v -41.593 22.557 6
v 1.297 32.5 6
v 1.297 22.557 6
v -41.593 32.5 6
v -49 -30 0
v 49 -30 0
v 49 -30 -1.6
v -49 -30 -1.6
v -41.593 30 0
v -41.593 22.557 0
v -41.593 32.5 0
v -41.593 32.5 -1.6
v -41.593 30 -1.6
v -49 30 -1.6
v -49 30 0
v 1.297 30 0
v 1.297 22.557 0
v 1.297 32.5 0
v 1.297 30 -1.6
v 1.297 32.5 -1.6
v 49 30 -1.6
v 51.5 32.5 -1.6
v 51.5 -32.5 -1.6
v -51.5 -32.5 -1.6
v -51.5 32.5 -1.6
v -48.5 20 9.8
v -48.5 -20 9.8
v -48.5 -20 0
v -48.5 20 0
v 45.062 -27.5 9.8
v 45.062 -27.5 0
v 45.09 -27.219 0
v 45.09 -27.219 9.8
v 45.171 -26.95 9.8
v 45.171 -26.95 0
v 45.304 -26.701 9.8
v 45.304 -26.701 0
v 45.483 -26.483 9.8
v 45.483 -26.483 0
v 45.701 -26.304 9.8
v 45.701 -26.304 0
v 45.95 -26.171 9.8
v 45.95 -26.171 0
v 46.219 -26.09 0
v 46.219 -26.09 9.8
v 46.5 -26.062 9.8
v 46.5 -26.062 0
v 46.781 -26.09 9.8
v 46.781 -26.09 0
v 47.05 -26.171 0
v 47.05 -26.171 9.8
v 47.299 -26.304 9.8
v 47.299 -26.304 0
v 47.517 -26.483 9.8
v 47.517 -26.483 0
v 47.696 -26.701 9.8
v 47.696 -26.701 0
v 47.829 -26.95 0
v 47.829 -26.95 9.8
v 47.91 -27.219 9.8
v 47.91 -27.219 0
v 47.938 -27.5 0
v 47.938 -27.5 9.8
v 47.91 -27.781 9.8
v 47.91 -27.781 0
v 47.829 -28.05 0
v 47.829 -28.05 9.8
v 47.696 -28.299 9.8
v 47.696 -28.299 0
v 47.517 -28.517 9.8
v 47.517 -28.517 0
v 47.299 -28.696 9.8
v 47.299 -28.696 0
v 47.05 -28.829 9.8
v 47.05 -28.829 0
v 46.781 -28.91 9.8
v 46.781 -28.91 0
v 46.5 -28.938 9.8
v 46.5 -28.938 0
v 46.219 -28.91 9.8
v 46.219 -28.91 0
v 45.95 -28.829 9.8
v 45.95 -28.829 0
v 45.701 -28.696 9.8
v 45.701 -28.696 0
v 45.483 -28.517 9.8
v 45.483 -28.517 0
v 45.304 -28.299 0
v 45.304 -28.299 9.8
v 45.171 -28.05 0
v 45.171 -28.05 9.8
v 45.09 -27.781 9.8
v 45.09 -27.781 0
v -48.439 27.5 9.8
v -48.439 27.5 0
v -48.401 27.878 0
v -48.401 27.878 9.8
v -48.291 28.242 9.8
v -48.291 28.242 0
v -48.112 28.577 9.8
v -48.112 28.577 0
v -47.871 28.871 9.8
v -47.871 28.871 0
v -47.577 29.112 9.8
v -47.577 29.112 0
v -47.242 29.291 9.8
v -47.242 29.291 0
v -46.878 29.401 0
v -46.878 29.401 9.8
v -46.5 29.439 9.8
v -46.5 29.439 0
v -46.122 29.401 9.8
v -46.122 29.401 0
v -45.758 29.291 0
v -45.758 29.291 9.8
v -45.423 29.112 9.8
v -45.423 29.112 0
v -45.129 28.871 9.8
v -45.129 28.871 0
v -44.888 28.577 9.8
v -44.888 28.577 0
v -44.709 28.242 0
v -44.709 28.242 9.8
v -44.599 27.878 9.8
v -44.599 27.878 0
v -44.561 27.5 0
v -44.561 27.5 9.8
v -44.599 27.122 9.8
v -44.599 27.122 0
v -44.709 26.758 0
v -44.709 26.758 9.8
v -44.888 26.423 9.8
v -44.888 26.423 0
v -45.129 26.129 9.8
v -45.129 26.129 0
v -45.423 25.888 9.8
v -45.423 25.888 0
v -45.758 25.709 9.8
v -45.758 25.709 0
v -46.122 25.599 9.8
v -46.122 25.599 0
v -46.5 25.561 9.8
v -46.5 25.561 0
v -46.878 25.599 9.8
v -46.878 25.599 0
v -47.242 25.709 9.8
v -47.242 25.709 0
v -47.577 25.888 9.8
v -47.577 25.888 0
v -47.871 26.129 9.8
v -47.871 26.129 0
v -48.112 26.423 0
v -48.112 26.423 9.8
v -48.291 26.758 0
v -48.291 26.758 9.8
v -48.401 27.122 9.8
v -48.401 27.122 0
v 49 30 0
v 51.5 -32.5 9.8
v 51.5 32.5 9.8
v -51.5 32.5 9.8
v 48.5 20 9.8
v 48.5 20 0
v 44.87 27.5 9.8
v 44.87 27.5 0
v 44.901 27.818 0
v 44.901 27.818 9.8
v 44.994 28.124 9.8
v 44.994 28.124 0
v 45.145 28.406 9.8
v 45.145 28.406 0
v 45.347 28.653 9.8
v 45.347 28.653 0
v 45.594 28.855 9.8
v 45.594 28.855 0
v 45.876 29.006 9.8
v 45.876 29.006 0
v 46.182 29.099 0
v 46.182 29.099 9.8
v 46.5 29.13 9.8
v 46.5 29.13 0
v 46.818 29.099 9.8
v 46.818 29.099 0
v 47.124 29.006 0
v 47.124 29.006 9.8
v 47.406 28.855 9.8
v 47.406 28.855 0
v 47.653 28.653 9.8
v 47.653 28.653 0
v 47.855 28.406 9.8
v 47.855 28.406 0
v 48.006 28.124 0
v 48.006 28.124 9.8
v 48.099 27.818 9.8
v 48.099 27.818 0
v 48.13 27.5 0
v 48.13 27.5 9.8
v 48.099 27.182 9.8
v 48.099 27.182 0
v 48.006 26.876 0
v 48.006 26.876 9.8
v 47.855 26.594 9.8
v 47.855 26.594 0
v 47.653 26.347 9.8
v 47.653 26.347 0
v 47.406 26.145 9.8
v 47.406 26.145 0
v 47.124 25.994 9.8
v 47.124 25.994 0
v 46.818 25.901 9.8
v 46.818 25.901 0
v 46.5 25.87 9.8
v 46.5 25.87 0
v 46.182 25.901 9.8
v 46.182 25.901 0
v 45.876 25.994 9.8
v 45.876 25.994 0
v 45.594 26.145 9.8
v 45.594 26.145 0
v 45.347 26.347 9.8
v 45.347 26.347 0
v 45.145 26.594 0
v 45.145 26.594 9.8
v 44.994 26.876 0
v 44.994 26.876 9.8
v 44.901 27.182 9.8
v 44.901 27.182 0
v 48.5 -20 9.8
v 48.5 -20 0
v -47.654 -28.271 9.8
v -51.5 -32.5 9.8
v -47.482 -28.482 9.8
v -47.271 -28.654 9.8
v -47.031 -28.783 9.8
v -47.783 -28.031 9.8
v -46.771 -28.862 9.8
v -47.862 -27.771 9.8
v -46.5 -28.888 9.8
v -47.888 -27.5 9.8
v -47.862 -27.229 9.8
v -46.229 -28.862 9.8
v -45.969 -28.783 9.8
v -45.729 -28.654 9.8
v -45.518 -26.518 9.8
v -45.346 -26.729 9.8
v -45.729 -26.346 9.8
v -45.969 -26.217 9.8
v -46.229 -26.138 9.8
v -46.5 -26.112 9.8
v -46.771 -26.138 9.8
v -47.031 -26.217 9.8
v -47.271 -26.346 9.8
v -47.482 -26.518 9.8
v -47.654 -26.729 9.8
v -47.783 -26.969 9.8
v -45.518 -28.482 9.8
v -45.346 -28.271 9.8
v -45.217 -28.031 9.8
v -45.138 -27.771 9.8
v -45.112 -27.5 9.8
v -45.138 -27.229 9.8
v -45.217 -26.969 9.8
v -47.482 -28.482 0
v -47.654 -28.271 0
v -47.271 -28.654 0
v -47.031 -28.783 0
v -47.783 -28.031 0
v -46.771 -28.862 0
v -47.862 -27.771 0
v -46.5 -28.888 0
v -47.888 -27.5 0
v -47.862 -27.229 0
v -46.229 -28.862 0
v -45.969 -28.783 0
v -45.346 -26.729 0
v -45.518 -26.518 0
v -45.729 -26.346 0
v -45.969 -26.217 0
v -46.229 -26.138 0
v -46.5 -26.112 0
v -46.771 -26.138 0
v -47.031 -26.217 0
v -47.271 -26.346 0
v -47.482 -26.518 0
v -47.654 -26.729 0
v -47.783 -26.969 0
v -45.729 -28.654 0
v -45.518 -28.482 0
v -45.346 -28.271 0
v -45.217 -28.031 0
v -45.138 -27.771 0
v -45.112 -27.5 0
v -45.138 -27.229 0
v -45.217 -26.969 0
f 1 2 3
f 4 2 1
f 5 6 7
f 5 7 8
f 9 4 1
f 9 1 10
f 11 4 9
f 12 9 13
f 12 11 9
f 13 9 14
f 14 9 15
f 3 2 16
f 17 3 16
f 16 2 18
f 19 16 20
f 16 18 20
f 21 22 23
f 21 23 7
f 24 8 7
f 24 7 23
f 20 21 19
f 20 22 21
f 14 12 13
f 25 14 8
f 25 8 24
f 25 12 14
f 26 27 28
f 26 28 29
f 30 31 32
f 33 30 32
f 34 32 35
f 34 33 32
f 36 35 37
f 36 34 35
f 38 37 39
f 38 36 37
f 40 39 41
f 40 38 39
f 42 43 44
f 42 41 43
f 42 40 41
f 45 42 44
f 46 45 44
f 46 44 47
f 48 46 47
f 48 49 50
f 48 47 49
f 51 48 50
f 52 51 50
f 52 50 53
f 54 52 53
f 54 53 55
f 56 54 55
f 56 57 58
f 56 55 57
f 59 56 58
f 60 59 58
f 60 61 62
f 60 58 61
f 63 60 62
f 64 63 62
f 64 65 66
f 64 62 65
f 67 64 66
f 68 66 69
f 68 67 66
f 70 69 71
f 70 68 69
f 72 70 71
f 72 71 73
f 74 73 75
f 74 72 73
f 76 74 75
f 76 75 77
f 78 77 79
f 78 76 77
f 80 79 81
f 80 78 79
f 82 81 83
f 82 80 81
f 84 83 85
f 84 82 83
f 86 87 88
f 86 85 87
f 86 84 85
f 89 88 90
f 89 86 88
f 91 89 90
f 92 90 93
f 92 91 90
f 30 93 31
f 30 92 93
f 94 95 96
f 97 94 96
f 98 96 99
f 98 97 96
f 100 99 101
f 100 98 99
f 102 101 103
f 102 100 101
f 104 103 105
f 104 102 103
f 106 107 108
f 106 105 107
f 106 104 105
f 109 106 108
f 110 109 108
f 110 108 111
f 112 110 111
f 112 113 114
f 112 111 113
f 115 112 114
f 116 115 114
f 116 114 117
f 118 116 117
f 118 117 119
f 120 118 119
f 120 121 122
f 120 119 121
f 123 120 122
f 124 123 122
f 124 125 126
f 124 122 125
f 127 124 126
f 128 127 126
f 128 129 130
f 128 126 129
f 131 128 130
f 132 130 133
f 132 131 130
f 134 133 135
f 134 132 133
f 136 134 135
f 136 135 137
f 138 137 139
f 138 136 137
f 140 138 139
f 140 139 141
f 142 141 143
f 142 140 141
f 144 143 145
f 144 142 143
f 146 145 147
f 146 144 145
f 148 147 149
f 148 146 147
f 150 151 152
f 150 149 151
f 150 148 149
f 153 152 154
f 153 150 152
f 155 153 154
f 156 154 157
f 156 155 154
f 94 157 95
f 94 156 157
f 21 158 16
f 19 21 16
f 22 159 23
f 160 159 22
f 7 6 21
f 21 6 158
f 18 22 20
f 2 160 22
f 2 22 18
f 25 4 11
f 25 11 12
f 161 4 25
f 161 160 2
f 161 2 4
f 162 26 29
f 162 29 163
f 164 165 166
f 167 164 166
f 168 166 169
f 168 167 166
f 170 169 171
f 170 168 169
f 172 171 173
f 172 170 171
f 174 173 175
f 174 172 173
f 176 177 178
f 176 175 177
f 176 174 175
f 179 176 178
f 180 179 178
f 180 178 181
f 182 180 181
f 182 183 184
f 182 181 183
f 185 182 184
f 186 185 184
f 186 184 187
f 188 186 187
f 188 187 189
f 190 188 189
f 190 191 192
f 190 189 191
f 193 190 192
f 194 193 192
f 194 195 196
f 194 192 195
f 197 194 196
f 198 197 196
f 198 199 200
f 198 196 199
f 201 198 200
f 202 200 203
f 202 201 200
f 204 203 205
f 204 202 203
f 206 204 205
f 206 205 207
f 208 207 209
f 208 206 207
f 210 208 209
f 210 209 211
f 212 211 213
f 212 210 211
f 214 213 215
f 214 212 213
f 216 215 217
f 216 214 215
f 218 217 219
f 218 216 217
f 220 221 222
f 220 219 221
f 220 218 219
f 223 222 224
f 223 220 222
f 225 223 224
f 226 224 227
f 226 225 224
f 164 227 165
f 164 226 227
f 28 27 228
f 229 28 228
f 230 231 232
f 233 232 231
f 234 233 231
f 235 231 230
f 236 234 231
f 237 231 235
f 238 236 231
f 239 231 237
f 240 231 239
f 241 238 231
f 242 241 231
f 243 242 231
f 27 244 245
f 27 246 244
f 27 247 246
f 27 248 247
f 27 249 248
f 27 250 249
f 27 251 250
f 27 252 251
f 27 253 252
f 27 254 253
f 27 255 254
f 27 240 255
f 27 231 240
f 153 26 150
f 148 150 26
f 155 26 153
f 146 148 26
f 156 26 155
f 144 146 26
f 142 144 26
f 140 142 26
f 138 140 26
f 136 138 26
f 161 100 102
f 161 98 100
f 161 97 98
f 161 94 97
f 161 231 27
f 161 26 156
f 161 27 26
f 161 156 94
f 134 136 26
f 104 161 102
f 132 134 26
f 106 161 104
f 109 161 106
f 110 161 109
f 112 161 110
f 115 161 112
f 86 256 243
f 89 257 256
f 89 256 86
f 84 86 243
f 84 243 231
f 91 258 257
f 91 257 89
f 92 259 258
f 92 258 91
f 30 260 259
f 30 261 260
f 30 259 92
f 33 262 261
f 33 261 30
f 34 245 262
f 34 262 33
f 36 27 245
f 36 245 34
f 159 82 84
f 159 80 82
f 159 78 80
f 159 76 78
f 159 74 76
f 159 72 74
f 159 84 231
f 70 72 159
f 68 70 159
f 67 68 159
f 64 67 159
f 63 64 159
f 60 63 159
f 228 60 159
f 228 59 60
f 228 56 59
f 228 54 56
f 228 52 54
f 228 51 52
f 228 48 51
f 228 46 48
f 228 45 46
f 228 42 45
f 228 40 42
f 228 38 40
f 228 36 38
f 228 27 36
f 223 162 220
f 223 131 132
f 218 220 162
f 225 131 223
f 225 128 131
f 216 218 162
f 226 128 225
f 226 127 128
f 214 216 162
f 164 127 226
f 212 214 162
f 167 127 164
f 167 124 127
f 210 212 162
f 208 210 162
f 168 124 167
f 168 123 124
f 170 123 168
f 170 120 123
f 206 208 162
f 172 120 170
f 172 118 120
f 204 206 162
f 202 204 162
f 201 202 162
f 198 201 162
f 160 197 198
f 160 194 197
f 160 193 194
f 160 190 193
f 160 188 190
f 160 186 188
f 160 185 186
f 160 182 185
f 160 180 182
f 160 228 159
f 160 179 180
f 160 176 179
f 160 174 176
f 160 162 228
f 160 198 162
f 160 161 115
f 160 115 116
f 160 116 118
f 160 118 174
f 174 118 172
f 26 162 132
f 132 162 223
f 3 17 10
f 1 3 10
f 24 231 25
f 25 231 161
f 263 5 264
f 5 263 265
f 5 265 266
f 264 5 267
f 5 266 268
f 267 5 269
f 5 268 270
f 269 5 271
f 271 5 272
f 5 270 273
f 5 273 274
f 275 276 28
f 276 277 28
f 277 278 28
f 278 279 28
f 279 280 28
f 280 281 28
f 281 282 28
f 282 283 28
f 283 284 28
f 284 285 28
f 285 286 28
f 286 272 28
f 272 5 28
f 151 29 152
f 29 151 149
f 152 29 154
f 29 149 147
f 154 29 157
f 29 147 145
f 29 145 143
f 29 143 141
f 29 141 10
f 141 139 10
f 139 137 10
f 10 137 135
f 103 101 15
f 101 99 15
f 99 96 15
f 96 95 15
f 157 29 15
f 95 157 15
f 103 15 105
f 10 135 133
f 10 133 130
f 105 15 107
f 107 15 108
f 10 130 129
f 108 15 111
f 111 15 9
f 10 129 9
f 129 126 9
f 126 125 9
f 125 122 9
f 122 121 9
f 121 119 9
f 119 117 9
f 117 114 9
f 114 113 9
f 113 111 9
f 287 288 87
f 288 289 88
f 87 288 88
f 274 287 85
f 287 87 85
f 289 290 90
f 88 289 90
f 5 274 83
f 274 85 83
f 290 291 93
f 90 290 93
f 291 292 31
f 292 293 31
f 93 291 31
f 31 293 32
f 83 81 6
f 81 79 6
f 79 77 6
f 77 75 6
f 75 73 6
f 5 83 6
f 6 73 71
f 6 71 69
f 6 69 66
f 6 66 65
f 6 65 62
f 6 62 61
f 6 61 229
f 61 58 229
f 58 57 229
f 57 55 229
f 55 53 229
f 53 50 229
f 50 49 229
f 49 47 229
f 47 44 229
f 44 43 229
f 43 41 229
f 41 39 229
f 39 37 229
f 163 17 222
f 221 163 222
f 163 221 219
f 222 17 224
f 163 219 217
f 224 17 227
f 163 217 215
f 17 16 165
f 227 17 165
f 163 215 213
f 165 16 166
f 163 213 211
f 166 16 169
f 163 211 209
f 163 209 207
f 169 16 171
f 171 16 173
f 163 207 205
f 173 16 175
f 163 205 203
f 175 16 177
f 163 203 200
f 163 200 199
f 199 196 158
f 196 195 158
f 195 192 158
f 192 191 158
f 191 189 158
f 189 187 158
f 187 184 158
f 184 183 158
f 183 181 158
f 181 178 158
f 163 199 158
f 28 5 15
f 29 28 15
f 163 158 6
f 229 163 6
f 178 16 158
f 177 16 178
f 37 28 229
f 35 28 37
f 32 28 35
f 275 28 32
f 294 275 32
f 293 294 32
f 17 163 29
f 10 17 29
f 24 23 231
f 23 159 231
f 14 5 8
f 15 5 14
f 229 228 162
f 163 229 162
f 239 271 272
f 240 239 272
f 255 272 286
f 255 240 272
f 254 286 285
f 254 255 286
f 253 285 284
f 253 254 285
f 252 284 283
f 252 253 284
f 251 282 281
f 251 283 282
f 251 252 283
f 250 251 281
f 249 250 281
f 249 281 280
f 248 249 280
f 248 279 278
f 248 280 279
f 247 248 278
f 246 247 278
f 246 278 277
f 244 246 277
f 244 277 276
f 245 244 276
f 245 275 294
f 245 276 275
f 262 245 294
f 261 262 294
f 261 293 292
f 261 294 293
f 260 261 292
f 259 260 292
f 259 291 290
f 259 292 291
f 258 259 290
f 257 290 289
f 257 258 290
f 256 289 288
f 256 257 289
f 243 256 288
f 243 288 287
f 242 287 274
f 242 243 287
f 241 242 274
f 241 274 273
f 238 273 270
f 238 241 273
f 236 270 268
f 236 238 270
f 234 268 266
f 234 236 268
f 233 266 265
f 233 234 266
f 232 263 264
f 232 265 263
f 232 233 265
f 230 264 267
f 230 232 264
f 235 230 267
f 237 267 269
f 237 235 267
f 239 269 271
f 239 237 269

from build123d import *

# Parameters (mm, degrees)
SKETCH2_W               = 103
SKETCH2_H               = 65
BOSS_EXTRUDE1_DEPTH     = 9.8
SKETCH4_W               = 97
SKETCH4_H               = 40
CUT_EXTRUDE1_DEPTH      = 35
SKETCH6_W               = 42.890315644
SKETCH6_H               = 9.943201627
CUT_EXTRUDE3_DEPTH      = 6
SKETCH9_W               = 103
SKETCH9_H               = 65
SKETCH9_W_2             = 98
SKETCH9_H_2             = 60
BOSS_EXTRUDE2_DEPTH     = 1.6
SKETCH10_W              = 42.890315644
SKETCH10_H              = 16.344193147
CUT_EXTRUDE4_DEPTH      = 9.943201627
CUT_EXTRUDE7_DEPTH      = 28
CUT_EXTRUDE7_DEPTH_BACK = 33
SKETCH14_R              = 1.629970135
SKETCH14_R_2            = 1.938580121
SKETCH14_R_3            = 1.388390768
SKETCH14_R_4            = 1.438089521


with BuildPart() as part:
    # Sketch2 → Boss-Extrude1 (new body)
    with BuildSketch(Plane.XY):
        Rectangle(SKETCH2_W, SKETCH2_H)
    extrude(amount=BOSS_EXTRUDE1_DEPTH)

    # Sketch4 → Cut-Extrude1 (cut)
    with BuildSketch(Plane.XY.offset(9.8)):
        Rectangle(SKETCH4_W, SKETCH4_H)
    extrude(amount=-CUT_EXTRUDE1_DEPTH, mode=Mode.SUBTRACT)

    # Sketch6 → Cut-Extrude3 (cut)
    with BuildSketch(Plane(origin=(0, 0, 0), x_dir=(-1, 0, 0), z_dir=(0, 0, -1))):
        with Locations((20.148258429, 27.528399187)):
            Rectangle(SKETCH6_W, SKETCH6_H)
    extrude(amount=-CUT_EXTRUDE3_DEPTH, mode=Mode.SUBTRACT)

    # Sketch9 → Boss-Extrude2 (add)
    with BuildSketch(Plane(origin=(0, 0, 0), x_dir=(-1, 0, 0), z_dir=(0, 0, -1))):
        Rectangle(SKETCH9_W, SKETCH9_H)
        Rectangle(SKETCH9_W_2, SKETCH9_H_2, mode=Mode.SUBTRACT)
    extrude(amount=BOSS_EXTRUDE2_DEPTH)

    # Sketch10 → Cut-Extrude4 (cut)
    with BuildSketch(Plane(origin=(0, 32.5, 0), x_dir=(1, 0, 0), z_dir=(0, 1, 0))):
        with Locations((-20.148258429, 8.172096574)):
            Rectangle(SKETCH10_W, SKETCH10_H)
    extrude(amount=-CUT_EXTRUDE4_DEPTH, mode=Mode.SUBTRACT)

    # Sketch14 → Cut-Extrude7 (cut, two sides: drawn at the far end of the back side and taken through both)
    with BuildSketch(Plane(origin=(0, 0, -1.6), x_dir=(-1, 0, 0), z_dir=(0, 0, -1)).offset(-CUT_EXTRUDE7_DEPTH_BACK)):
        with Locations((-46.5, 27.5)):
            Circle(SKETCH14_R)
        with Locations((46.5, 27.5)):
            Circle(SKETCH14_R_2)
        with Locations((46.5, -27.5)):
            Circle(SKETCH14_R_3)
        with Locations((-46.5, -27.5)):
            Circle(SKETCH14_R_4)
    extrude(amount=CUT_EXTRUDE7_DEPTH + CUT_EXTRUDE7_DEPTH_BACK, mode=Mode.SUBTRACT)


solid = part.part
